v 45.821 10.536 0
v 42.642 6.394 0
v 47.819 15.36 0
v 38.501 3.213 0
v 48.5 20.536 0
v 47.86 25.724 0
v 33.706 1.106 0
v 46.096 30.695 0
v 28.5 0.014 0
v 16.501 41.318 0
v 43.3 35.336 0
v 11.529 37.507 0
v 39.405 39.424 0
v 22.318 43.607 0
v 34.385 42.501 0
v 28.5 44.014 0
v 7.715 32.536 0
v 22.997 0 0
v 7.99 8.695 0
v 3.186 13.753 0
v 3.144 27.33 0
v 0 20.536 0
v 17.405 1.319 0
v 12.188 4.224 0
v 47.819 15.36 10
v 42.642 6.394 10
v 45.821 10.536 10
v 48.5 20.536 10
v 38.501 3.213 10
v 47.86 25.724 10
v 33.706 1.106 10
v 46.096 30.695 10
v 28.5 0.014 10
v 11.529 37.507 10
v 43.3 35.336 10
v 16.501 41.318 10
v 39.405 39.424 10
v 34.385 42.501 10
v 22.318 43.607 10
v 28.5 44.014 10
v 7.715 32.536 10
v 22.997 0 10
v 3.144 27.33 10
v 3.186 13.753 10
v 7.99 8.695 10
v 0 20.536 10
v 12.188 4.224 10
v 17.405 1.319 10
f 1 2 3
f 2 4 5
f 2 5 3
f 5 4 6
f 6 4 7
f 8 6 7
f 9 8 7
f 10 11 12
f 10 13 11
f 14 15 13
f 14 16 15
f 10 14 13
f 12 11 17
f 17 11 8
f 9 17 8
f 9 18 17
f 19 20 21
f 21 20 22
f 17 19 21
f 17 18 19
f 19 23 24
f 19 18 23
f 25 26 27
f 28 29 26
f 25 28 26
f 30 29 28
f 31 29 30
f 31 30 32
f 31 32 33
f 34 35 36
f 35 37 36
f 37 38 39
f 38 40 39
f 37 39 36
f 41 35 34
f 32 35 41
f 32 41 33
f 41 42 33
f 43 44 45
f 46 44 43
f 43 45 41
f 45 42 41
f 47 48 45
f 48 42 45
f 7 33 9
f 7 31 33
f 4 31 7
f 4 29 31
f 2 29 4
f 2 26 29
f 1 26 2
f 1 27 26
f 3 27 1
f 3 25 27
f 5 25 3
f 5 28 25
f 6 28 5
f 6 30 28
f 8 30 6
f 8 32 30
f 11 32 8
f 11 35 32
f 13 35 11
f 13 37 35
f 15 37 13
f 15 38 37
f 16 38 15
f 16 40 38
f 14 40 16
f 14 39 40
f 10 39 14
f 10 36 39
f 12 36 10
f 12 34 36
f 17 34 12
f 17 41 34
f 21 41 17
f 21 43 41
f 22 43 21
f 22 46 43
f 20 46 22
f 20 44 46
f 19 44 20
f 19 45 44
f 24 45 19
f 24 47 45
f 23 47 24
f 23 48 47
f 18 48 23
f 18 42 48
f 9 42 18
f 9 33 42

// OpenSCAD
$fn = 32;

// ----------------------------------------------------------------------
// Cam disc: base radius 20.0 mm, lift 4.0 mm, 24 profile points
// ----------------------------------------------------------------------

// --- parameters (mm) ---
profile_height = 10;      // extrusion height
profile_points = 24;      // points of the closed outline

profile = [[48.5, 20.536], [47.86, 25.724], [46.096, 30.695], [43.3, 35.336], [39.405, 39.424], [34.385, 42.501], [28.5, 44.014], [22.318, 43.607], [16.501, 41.318], [11.529, 37.507], [7.715, 32.536], [3.144, 27.33], [0, 20.536], [3.186, 13.753], [7.99, 8.695], [12.188, 4.224], [17.405, 1.319], [22.997, 0], [28.5, 0.014], [33.706, 1.106], [38.501, 3.213], [42.642, 6.394], [45.821, 10.536], [47.819, 15.36]];  // single closed polygon, 24 points, counter clockwise

// --- the one profile operation ---
linear_extrude(height = profile_height) polygon(points = profile);
